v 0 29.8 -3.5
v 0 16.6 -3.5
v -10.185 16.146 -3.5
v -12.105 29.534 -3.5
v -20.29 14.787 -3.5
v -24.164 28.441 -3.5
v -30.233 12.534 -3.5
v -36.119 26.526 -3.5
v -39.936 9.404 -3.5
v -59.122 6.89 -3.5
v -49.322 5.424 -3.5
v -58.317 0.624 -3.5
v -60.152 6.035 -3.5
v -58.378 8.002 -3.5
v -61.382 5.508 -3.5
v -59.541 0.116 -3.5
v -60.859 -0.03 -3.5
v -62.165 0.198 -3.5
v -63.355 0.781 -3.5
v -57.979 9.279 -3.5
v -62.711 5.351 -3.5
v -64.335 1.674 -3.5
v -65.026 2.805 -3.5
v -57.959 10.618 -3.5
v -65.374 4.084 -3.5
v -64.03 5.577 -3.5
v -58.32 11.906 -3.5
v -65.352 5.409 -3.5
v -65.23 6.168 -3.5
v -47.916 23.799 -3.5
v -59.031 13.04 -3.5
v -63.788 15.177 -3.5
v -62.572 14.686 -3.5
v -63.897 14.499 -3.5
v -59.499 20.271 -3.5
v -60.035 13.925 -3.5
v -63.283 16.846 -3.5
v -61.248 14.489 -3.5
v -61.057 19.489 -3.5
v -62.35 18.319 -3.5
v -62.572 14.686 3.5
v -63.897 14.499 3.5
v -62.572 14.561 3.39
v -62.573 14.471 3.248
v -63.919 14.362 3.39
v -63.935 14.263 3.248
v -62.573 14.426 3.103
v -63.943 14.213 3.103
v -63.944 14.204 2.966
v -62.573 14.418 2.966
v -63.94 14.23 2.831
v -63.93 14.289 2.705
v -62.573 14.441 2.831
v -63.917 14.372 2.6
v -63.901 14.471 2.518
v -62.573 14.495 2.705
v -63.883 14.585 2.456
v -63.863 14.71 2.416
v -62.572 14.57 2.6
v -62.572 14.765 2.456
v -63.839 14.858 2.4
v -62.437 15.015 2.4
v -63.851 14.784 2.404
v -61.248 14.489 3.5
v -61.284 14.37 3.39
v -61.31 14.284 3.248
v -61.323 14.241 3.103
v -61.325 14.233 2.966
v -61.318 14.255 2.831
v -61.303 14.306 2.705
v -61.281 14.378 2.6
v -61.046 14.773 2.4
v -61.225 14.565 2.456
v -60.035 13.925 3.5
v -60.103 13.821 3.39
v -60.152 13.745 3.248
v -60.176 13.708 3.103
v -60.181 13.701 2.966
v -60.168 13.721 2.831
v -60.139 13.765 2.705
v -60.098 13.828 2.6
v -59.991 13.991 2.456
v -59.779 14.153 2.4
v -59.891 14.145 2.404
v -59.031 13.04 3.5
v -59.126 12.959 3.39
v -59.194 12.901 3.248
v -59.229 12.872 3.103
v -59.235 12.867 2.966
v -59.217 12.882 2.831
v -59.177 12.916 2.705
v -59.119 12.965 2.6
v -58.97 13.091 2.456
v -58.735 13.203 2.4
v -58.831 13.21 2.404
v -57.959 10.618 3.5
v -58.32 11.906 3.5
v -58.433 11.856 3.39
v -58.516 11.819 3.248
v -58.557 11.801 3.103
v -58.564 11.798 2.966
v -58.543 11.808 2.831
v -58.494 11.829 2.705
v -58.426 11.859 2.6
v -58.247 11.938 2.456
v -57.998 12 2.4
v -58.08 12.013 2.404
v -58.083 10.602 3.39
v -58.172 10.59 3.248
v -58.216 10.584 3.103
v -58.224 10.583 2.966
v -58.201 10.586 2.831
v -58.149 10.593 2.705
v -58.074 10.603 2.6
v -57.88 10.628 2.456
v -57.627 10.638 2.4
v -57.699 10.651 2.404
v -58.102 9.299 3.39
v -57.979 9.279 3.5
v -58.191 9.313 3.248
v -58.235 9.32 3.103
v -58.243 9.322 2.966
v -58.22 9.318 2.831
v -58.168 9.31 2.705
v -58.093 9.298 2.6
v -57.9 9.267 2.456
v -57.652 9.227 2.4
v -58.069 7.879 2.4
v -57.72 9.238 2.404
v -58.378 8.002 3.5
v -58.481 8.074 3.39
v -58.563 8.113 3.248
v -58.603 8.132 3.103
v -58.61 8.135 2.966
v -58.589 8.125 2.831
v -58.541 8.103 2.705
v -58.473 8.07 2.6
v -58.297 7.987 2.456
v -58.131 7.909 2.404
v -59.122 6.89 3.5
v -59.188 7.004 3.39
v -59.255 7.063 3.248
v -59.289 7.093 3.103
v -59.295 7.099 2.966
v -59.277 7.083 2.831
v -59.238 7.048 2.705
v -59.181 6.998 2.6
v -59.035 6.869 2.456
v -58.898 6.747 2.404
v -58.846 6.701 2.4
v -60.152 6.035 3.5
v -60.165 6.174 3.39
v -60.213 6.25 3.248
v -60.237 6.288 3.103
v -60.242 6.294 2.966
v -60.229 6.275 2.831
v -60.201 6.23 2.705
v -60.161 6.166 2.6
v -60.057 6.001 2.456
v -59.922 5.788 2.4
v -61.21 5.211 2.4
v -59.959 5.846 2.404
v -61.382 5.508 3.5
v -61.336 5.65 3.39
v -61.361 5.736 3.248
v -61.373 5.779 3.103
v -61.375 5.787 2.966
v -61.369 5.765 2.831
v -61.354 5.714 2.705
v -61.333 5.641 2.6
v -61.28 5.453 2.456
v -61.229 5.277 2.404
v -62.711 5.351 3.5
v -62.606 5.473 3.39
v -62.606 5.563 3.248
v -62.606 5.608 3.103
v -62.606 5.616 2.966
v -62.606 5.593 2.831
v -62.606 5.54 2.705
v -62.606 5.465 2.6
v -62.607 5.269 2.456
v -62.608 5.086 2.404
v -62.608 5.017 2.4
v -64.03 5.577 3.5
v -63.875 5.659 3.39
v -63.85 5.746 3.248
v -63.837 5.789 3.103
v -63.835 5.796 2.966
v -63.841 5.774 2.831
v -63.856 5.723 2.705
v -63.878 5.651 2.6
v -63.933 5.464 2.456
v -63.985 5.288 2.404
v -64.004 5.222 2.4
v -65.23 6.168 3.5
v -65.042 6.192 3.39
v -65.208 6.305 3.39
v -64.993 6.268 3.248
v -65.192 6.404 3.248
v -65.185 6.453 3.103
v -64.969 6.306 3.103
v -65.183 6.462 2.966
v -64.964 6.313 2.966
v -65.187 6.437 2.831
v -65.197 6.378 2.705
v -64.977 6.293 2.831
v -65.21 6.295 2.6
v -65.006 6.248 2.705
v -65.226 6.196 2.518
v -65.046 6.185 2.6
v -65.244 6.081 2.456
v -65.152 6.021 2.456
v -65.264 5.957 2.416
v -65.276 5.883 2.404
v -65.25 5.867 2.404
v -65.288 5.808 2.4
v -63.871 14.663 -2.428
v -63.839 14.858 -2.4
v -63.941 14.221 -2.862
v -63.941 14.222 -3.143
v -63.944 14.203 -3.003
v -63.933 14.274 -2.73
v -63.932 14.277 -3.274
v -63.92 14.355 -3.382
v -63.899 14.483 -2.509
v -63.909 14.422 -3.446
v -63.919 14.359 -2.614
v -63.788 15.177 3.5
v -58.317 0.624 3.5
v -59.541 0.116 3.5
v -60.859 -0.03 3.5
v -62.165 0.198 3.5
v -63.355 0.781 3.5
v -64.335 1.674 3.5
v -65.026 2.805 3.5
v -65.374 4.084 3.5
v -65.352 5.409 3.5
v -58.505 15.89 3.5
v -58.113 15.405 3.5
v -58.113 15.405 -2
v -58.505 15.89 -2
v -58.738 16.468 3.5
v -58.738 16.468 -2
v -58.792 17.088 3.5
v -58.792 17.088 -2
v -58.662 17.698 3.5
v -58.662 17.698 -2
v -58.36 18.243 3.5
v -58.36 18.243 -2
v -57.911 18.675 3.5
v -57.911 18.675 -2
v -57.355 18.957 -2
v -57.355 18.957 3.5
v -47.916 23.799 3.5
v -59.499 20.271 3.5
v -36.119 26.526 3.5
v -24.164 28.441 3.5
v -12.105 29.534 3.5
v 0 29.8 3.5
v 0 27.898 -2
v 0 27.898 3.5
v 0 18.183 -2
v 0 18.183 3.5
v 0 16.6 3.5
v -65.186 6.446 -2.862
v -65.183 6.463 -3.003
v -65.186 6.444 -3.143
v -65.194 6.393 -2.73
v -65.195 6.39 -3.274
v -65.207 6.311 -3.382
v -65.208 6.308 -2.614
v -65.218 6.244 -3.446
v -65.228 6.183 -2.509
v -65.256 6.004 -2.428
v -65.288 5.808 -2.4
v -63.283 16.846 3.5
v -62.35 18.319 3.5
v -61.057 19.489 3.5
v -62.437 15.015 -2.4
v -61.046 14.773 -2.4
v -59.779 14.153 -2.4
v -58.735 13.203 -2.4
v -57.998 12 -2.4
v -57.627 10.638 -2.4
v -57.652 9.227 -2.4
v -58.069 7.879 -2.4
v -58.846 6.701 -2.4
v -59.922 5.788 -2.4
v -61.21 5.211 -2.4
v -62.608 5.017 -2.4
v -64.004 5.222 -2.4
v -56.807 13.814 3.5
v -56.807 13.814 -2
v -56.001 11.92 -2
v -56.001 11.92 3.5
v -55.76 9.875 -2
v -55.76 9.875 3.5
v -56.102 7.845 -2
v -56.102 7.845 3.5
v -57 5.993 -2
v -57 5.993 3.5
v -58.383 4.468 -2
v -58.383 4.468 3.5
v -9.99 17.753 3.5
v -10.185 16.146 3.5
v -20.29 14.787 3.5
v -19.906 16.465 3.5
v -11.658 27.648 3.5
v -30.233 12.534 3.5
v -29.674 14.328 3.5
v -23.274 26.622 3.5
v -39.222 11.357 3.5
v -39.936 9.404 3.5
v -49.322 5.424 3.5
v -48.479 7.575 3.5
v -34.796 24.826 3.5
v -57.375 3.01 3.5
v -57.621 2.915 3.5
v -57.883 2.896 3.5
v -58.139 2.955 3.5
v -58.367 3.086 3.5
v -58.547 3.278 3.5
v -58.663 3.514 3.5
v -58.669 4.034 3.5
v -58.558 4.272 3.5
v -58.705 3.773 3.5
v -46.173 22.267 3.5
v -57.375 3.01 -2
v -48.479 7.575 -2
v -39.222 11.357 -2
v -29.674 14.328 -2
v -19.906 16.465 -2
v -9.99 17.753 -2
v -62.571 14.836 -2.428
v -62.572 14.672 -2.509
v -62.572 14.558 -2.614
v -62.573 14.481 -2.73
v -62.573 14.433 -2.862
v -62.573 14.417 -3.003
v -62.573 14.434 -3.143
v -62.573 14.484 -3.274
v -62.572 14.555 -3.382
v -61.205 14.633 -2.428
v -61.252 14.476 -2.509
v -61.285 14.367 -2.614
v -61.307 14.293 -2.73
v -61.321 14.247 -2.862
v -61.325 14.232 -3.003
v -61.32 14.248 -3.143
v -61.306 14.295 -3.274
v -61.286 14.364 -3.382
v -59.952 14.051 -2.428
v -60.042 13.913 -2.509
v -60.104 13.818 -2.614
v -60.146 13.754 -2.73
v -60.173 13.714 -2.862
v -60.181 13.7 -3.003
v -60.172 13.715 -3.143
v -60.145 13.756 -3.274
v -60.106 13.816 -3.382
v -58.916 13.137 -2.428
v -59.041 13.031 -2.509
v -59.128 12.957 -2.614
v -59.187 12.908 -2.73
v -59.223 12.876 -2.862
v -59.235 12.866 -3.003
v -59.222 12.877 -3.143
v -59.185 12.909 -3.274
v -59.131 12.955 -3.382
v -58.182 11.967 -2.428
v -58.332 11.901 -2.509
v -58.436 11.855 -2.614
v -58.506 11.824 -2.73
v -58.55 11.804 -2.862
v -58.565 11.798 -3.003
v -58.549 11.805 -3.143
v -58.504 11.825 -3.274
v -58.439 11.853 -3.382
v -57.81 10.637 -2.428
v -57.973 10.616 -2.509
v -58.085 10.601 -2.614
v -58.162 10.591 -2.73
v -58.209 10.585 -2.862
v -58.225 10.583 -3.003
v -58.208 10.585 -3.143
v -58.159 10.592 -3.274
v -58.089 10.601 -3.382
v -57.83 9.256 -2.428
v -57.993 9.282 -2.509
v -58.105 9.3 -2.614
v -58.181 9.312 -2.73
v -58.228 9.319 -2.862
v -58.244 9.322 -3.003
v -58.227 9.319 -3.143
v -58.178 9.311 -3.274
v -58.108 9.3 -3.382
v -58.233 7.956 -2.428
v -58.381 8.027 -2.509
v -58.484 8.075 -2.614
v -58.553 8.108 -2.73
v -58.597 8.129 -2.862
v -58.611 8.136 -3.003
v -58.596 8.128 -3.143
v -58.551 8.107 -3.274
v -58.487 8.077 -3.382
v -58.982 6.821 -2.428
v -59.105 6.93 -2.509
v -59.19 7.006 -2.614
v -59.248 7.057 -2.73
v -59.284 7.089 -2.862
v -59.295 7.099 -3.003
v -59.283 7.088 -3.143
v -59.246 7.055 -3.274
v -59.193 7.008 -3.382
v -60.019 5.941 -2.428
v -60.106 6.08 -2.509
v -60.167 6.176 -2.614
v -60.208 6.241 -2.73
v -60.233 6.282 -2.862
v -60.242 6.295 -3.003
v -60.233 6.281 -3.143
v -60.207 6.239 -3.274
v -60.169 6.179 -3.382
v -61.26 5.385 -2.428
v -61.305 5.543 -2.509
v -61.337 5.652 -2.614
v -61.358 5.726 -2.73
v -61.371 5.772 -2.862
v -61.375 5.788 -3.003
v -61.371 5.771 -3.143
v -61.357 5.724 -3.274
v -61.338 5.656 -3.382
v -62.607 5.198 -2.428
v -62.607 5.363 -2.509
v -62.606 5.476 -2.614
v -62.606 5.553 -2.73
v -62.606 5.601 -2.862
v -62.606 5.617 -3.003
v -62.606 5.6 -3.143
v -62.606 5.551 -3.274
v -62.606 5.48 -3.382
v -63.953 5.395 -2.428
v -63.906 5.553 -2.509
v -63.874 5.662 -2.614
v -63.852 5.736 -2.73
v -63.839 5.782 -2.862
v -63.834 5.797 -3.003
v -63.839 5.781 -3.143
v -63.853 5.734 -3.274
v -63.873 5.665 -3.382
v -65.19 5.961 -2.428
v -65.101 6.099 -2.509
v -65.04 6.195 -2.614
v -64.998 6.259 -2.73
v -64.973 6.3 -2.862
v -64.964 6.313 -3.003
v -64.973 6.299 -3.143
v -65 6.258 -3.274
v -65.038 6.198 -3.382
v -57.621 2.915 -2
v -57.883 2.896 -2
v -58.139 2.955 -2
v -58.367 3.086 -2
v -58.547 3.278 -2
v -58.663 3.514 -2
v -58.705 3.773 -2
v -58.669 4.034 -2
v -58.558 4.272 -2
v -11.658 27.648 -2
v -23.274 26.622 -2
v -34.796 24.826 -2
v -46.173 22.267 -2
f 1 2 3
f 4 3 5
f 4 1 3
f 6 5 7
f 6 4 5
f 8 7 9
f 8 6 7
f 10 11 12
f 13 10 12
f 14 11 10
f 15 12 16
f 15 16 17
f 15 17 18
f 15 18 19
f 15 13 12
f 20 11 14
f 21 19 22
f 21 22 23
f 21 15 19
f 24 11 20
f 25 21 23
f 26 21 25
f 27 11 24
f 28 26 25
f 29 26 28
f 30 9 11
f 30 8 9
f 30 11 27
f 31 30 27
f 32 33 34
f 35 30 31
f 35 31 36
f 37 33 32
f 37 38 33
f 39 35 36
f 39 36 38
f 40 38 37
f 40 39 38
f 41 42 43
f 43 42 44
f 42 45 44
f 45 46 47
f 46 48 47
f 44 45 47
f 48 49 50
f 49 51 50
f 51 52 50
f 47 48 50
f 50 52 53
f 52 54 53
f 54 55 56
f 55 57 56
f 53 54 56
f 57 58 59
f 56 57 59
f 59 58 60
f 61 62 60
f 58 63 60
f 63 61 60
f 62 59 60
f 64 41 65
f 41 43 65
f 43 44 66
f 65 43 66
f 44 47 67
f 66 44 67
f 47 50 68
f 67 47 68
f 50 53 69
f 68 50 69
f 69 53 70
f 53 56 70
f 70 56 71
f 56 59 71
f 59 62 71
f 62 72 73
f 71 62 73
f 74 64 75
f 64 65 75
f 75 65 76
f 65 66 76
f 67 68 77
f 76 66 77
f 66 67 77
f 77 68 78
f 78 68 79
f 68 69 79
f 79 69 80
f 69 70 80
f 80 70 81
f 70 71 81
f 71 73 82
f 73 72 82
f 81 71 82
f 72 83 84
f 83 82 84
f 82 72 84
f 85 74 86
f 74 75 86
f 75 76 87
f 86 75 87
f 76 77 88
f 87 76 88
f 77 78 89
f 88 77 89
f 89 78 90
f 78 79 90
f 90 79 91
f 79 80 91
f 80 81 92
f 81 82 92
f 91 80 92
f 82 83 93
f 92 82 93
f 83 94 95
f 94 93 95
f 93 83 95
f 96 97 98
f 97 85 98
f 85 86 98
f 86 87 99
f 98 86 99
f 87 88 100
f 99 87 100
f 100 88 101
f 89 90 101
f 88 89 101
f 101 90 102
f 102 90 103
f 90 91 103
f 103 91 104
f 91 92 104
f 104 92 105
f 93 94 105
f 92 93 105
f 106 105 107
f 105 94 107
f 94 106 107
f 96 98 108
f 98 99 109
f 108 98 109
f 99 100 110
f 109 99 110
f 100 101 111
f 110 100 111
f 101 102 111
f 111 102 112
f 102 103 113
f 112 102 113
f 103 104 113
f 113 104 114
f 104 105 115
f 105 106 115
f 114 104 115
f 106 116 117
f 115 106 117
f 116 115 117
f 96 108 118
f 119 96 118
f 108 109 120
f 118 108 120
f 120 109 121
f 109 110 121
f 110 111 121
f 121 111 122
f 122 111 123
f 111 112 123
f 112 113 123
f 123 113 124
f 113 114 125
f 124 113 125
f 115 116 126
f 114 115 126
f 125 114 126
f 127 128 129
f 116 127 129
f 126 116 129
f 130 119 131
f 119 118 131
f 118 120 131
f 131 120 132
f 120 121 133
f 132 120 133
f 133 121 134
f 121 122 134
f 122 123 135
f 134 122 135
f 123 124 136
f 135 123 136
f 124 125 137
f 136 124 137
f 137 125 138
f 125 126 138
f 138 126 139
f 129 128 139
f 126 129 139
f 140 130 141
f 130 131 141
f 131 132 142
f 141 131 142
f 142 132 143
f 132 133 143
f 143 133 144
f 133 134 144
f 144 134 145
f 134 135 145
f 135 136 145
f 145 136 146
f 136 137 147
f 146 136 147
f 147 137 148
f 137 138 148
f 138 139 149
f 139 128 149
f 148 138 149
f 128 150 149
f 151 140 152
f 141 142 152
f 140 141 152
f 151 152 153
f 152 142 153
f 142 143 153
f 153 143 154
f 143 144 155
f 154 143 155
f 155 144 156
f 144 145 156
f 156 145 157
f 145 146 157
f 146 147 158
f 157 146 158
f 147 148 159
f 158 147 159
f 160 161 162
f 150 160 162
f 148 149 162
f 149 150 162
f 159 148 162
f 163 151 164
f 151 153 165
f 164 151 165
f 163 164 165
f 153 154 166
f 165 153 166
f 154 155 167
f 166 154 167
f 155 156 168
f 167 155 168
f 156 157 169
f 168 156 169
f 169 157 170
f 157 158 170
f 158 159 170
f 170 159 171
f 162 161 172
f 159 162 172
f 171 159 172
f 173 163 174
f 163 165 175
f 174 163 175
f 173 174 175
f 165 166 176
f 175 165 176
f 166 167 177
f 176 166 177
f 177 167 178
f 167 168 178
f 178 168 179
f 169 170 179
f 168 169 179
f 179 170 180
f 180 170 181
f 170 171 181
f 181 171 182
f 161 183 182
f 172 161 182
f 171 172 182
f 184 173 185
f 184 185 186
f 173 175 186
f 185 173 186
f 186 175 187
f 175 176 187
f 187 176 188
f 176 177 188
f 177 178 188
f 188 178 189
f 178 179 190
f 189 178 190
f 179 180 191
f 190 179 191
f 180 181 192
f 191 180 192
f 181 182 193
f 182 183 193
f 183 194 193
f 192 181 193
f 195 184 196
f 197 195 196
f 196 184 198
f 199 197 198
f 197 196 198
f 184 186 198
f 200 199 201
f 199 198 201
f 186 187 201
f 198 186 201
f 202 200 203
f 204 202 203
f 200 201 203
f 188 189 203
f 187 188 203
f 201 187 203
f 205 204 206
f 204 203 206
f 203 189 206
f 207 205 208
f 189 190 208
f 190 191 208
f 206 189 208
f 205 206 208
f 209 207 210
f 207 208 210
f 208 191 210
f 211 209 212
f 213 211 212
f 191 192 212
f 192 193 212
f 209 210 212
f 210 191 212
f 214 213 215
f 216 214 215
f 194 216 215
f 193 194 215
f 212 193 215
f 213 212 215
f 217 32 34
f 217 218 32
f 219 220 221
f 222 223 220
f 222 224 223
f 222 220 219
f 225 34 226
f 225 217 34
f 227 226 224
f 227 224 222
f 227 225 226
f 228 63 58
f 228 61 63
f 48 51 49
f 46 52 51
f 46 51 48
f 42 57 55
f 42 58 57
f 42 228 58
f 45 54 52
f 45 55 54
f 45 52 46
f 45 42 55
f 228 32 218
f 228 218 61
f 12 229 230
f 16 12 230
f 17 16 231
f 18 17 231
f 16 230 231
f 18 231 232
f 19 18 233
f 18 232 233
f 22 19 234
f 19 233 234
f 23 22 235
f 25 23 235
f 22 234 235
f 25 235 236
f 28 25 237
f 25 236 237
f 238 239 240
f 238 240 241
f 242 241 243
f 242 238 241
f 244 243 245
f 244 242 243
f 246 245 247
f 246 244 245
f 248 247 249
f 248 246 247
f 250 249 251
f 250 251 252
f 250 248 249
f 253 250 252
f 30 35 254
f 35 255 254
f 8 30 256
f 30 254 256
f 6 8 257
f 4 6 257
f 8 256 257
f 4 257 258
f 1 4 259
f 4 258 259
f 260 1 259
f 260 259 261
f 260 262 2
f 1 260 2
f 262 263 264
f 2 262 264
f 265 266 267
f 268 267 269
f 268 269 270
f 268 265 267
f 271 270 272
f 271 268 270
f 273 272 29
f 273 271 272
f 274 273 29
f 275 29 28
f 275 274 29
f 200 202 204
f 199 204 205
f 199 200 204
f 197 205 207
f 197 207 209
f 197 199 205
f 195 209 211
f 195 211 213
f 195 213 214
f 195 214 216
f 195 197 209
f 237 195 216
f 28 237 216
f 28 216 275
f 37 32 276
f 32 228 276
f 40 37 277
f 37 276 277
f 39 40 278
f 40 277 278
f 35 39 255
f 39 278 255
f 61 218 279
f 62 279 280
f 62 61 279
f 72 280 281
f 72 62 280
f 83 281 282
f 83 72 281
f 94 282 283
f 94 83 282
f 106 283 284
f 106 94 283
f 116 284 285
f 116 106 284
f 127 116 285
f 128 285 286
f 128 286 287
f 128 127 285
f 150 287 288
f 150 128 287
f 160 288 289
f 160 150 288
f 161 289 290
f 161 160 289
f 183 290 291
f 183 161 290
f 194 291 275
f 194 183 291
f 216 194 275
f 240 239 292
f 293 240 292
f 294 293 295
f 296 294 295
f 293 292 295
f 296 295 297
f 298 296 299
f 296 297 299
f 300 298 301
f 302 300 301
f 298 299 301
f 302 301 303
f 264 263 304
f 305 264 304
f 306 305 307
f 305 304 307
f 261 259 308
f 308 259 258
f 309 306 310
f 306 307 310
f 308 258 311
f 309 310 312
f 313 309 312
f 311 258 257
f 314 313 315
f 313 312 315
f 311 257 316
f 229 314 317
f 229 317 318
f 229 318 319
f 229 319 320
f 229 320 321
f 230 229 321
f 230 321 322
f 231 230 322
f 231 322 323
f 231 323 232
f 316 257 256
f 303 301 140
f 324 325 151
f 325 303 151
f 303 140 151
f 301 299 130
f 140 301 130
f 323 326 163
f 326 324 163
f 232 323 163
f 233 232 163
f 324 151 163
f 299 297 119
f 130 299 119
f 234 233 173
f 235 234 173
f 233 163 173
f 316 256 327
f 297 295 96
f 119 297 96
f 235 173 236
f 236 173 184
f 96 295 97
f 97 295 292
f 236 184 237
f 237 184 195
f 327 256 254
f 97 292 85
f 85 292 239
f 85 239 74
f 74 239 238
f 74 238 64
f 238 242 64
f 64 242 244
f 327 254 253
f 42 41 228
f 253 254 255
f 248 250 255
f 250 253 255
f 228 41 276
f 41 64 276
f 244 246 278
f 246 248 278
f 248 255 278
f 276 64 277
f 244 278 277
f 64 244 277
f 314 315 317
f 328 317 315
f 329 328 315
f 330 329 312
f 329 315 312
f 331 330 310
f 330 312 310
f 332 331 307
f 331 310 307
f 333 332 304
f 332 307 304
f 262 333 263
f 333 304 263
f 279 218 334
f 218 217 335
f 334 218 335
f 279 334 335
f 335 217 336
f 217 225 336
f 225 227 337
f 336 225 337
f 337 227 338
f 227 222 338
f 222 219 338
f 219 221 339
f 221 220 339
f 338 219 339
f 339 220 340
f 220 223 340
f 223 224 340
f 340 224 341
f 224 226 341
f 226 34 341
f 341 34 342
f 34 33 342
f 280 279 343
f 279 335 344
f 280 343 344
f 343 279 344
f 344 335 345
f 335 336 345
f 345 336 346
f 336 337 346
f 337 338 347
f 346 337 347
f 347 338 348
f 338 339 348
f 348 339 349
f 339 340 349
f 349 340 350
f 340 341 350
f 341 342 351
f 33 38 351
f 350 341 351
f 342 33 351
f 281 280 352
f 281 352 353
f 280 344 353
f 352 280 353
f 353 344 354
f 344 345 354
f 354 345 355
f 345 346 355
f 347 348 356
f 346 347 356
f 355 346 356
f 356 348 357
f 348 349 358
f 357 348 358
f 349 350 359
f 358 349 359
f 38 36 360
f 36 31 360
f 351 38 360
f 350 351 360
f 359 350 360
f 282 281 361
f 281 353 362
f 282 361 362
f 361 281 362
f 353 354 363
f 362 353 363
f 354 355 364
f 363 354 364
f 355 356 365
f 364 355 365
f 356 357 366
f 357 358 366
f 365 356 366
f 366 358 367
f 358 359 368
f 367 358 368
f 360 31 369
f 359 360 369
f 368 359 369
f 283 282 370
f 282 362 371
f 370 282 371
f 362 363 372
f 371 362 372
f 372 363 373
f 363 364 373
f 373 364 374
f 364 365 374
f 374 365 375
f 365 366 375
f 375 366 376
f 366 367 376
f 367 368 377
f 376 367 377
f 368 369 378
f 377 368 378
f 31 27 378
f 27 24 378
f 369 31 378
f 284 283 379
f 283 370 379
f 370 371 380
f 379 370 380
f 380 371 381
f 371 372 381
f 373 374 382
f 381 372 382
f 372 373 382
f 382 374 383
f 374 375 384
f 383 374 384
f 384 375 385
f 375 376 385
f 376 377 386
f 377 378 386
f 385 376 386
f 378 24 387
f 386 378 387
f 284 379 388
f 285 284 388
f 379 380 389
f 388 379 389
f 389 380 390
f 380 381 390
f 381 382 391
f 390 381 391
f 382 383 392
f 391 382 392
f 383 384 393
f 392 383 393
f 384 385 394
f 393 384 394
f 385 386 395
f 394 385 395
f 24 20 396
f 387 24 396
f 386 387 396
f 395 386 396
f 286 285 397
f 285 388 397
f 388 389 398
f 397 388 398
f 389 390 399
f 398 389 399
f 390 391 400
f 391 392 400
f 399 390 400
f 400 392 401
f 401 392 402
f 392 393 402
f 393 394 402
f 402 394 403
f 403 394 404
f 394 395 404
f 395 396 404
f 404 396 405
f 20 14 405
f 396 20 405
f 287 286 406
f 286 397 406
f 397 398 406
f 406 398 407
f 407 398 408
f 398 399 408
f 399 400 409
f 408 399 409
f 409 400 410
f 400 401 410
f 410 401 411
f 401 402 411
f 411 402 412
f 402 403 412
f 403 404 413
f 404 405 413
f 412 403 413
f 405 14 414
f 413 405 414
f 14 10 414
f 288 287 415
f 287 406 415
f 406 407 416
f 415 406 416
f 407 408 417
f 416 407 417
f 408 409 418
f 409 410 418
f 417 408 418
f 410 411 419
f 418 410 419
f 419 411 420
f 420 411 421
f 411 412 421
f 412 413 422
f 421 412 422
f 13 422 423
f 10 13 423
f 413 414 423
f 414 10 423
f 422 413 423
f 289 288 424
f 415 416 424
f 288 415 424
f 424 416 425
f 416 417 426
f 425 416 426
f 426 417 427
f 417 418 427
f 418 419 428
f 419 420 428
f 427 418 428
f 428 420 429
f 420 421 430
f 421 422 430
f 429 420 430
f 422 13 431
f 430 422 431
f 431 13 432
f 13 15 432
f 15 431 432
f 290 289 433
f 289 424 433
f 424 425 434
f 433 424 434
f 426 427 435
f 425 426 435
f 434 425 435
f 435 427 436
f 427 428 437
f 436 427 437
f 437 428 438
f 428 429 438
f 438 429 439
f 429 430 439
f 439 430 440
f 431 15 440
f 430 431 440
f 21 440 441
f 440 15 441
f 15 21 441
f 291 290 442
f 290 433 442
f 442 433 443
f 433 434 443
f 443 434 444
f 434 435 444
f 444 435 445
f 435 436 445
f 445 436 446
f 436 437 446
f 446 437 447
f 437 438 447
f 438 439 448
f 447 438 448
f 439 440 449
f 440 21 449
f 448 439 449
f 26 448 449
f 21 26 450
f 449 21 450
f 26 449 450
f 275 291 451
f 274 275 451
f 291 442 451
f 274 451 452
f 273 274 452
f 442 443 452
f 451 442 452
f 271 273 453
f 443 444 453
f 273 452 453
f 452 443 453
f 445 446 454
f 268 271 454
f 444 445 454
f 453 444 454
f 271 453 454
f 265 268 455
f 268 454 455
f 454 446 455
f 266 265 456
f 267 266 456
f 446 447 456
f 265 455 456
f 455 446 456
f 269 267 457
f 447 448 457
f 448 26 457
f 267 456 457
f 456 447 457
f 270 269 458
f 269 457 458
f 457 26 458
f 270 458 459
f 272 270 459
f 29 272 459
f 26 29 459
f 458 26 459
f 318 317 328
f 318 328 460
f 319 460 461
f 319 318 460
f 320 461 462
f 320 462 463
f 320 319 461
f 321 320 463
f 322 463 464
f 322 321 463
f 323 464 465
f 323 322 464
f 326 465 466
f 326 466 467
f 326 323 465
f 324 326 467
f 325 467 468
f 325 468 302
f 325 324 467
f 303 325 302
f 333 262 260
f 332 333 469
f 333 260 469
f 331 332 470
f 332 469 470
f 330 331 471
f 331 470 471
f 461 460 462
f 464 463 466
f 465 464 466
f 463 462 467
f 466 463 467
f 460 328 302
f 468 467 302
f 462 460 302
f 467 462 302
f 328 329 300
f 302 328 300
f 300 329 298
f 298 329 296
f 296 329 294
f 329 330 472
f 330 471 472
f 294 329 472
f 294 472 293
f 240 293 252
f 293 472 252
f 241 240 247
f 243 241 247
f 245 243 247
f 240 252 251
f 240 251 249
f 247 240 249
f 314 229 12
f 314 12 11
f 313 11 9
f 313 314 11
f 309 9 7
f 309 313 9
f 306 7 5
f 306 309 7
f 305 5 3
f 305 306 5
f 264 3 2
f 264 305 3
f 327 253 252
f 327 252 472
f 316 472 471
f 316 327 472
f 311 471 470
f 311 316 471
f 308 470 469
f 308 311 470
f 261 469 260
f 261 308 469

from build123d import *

# Parameters (mm, degrees)
PAD003_DEPTH = 3.5
POCKET_DEPTH = 5.5


with BuildPart() as stirn:
    # Sketch010 → Pad003 (new body, symmetric)
    with BuildSketch(Plane.XY):
        with BuildLine():
            ThreePointArc((59.498979, 20.271308), (30.157918, 27.585958), (0, 29.8))
            Line((0, 29.8), (0, 16.6))
            ThreePointArc((58.317055, 0.623642), (30.232941, 12.533656), (0, 16.6))
            ThreePointArc((58.317055, 0.623642), (63.354776, 0.781276), (65.351677, 5.409004))
            Line((63.7883, 15.177117), (65.351677, 5.409004))
            ThreePointArc((63.7883, 15.177117), (62.350118, 18.319069), (59.498979, 20.271308))
        make_face()
    extrude(amount=PAD003_DEPTH, both=True)

    # Sketch009 → Pocket (cut)
    with BuildSketch(Plane.XY.offset(3.5)):
        with BuildLine():
            Line((0, 27.898268), (0, 18.183007))
            ThreePointArc((57.375322, 3.010124), (29.674349, 14.327664), (0, 18.183007))
            ThreePointArc((57.375322, 3.010124), (58.546948, 3.277627), (58.382807, 4.46814))
            ThreePointArc((58.112759, 15.405314), (55.75963, 9.875292), (58.382807, 4.46814))
            ThreePointArc((58.112759, 15.405314), (58.750082, 17.397997), (57.35497, 18.957045))
            ThreePointArc((57.35497, 18.957045), (29.050369, 25.819583), (0, 27.898268))
        make_face()
    extrude(amount=-POCKET_DEPTH, mode=Mode.SUBTRACT)

    # Sketch011 (on Face2 of Pocket) → Groove (revolve, cut)
    with BuildSketch(Plane(origin=(62.588677, 10.017255, 0), x_dir=(-0.158038, 0.987433, 0), z_dir=(0.987433, 0.158038, 0))):
        with BuildLine():
            Line((0, -3.6), (0, 3.6))
            Line((0, 3.6), (5, 3.6))
            ThreePointArc((5, 3.6), (4.4, 3), (5, 2.4))
            Line((5, -2.4), (5, 2.4))
            ThreePointArc((5, -2.4), (4.400007, -3), (5, -3.6))
            Line((0, -3.6), (5, -3.6))
        make_face()
    revolve(axis=Axis((62.588677, 10.017255, 0), (0, 0, 1)), mode=Mode.SUBTRACT)


with BuildPart() as part_mirroring:
    # Part__Mirroring: instance of Stirn
    add(stirn.part.mirror(Plane(origin=(0, 0, 0), x_dir=(0, -1, 0), z_dir=(1, 0, 0))))


solid = part_mirroring.part
